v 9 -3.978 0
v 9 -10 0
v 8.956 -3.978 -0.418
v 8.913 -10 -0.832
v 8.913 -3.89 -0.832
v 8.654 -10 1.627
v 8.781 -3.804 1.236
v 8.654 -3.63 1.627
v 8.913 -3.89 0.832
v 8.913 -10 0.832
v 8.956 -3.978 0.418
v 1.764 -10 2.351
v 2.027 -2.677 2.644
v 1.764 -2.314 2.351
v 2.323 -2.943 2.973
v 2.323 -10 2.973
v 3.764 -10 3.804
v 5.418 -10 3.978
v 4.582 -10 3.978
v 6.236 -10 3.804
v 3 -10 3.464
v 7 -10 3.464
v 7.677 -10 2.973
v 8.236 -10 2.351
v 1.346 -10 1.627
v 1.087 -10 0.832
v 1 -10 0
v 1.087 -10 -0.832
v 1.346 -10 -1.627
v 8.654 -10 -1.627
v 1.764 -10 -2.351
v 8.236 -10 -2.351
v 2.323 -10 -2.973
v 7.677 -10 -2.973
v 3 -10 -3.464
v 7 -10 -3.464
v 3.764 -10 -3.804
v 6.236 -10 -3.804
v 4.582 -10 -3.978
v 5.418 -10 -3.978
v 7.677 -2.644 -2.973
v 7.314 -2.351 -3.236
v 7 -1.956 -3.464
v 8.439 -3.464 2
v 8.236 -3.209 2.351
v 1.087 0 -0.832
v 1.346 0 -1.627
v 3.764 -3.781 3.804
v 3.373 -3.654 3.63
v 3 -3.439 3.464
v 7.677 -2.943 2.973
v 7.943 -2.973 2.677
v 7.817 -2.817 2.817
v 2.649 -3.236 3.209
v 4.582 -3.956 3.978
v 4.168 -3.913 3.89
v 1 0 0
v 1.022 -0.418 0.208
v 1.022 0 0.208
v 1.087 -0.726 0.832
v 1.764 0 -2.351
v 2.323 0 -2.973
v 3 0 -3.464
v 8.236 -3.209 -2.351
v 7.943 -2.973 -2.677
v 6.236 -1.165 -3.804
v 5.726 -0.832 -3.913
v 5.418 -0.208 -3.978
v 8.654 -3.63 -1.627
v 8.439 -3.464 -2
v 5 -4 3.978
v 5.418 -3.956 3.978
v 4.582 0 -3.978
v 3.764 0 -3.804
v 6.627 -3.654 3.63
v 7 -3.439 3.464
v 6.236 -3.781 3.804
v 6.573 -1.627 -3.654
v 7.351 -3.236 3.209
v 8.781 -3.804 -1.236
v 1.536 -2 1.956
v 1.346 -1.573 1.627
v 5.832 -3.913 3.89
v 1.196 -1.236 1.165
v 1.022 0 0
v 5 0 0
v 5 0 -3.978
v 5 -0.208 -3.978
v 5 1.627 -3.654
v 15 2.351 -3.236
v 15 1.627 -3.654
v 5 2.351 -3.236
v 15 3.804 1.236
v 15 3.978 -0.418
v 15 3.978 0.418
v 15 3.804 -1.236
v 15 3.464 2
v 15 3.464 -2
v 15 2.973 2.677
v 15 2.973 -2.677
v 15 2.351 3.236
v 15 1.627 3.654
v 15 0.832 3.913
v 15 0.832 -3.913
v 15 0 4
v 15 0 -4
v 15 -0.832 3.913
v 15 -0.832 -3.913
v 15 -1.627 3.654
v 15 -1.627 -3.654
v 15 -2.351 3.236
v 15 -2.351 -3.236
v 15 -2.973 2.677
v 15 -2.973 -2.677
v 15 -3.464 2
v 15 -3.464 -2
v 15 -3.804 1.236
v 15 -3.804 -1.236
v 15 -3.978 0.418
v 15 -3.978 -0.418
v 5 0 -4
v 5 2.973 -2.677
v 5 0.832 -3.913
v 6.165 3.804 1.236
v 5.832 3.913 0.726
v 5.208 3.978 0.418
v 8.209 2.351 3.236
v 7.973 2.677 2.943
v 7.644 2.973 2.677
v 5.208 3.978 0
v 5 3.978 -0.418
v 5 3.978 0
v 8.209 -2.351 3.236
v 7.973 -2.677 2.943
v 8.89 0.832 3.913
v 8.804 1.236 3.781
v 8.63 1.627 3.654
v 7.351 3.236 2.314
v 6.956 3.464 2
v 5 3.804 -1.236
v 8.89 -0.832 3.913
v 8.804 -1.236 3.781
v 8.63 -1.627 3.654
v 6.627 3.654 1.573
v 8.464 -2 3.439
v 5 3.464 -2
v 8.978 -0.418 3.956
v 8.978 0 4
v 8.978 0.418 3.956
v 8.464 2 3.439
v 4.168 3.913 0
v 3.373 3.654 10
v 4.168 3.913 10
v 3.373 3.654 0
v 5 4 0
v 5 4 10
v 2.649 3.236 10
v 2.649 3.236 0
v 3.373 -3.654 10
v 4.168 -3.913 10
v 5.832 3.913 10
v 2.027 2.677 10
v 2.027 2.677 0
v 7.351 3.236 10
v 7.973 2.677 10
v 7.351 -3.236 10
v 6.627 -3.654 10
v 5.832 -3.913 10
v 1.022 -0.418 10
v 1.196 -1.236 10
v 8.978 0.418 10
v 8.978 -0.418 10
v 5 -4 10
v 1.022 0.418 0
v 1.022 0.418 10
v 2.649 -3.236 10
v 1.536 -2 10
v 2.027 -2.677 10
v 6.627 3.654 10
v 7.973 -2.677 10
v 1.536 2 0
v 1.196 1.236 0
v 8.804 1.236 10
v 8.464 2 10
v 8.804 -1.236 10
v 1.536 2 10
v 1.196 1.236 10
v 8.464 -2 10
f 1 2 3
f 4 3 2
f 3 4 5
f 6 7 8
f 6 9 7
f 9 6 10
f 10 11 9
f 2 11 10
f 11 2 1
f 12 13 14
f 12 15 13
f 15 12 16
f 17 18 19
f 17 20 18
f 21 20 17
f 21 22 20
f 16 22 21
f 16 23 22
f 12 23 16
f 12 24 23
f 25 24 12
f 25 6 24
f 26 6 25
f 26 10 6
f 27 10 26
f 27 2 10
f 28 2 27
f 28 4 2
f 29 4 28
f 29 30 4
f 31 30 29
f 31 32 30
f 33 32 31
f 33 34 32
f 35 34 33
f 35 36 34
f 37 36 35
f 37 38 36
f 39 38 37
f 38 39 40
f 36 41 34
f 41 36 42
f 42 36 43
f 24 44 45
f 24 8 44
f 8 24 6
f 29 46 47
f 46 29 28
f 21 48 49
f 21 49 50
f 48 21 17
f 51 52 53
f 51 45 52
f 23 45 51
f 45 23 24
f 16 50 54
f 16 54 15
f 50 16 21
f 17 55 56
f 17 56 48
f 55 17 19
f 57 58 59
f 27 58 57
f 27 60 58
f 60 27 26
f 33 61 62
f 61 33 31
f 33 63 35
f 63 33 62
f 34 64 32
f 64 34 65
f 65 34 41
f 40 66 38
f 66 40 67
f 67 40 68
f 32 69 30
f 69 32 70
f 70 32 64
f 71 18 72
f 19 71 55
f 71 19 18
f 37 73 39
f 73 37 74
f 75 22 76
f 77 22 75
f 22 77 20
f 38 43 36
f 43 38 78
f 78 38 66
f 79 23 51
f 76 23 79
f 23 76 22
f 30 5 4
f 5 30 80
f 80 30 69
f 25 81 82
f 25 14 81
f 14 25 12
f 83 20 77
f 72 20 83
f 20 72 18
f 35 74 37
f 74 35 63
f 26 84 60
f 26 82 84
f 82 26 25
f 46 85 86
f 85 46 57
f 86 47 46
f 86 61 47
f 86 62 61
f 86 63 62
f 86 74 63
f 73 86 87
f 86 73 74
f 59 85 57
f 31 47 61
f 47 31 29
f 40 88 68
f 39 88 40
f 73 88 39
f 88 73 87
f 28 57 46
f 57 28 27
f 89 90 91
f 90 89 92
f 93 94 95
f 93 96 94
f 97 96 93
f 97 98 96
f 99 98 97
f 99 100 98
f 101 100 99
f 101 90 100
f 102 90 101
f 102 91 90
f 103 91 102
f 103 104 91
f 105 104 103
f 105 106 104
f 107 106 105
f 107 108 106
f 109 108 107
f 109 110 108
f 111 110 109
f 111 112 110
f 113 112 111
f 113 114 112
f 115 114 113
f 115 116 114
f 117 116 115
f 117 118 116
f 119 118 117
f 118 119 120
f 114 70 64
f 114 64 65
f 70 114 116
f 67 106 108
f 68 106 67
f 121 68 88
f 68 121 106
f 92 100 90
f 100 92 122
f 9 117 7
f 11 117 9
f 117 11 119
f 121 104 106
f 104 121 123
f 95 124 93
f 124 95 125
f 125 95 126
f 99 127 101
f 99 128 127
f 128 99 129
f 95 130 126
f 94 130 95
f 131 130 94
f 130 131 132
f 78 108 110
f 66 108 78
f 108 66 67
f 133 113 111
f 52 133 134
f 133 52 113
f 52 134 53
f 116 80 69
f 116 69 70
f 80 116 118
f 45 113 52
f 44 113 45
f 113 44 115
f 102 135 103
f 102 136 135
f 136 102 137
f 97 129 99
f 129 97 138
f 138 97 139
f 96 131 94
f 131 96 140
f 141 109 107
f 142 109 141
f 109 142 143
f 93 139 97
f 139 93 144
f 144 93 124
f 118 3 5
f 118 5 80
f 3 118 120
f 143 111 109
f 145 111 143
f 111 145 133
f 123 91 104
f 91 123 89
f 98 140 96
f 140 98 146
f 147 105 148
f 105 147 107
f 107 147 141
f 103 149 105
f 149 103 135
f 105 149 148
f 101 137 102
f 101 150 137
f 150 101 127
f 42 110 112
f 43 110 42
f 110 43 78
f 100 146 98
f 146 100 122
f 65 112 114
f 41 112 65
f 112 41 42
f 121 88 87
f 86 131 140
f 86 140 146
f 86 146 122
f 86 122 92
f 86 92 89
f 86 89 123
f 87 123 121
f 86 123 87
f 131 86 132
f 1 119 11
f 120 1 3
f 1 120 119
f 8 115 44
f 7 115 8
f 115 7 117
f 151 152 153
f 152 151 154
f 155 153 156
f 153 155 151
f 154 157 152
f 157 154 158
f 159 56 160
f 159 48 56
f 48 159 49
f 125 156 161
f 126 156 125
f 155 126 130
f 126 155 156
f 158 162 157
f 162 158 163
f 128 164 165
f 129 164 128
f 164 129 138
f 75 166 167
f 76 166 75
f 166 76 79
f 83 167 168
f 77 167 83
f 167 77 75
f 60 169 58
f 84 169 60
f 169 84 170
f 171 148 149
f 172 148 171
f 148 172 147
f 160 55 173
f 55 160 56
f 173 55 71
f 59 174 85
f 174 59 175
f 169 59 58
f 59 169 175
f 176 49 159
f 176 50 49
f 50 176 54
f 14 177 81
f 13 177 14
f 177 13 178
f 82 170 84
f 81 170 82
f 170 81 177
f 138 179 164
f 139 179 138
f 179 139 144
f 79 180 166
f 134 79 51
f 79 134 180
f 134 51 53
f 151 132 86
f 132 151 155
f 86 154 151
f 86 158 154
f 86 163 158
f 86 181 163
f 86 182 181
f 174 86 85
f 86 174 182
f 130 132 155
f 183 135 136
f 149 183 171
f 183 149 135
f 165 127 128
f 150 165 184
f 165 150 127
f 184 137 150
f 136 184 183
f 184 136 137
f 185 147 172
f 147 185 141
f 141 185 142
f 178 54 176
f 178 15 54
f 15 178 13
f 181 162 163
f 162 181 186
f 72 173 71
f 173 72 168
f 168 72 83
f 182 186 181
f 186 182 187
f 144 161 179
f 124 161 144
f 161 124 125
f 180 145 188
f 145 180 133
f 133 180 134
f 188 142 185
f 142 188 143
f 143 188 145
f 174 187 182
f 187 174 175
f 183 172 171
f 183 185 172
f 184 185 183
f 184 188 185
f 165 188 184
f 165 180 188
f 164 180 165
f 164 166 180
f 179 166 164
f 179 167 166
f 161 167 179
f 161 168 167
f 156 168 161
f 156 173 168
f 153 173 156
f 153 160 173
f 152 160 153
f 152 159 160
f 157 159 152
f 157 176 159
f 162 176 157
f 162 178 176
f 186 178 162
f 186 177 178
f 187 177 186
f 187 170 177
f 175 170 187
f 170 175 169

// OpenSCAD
$fn=30;
translate([5, 0, 0]) rotate([90, 0, 0]) cylinder(h=10, r1=4, r2=4);
translate([5, 0, 0]) rotate([0, 90, 0]) cylinder(h=10, r1=4, r2=4);
translate([5, 0, 0]) rotate([0, 0, 90]) cylinder(h=10, r1=4, r2=4);
